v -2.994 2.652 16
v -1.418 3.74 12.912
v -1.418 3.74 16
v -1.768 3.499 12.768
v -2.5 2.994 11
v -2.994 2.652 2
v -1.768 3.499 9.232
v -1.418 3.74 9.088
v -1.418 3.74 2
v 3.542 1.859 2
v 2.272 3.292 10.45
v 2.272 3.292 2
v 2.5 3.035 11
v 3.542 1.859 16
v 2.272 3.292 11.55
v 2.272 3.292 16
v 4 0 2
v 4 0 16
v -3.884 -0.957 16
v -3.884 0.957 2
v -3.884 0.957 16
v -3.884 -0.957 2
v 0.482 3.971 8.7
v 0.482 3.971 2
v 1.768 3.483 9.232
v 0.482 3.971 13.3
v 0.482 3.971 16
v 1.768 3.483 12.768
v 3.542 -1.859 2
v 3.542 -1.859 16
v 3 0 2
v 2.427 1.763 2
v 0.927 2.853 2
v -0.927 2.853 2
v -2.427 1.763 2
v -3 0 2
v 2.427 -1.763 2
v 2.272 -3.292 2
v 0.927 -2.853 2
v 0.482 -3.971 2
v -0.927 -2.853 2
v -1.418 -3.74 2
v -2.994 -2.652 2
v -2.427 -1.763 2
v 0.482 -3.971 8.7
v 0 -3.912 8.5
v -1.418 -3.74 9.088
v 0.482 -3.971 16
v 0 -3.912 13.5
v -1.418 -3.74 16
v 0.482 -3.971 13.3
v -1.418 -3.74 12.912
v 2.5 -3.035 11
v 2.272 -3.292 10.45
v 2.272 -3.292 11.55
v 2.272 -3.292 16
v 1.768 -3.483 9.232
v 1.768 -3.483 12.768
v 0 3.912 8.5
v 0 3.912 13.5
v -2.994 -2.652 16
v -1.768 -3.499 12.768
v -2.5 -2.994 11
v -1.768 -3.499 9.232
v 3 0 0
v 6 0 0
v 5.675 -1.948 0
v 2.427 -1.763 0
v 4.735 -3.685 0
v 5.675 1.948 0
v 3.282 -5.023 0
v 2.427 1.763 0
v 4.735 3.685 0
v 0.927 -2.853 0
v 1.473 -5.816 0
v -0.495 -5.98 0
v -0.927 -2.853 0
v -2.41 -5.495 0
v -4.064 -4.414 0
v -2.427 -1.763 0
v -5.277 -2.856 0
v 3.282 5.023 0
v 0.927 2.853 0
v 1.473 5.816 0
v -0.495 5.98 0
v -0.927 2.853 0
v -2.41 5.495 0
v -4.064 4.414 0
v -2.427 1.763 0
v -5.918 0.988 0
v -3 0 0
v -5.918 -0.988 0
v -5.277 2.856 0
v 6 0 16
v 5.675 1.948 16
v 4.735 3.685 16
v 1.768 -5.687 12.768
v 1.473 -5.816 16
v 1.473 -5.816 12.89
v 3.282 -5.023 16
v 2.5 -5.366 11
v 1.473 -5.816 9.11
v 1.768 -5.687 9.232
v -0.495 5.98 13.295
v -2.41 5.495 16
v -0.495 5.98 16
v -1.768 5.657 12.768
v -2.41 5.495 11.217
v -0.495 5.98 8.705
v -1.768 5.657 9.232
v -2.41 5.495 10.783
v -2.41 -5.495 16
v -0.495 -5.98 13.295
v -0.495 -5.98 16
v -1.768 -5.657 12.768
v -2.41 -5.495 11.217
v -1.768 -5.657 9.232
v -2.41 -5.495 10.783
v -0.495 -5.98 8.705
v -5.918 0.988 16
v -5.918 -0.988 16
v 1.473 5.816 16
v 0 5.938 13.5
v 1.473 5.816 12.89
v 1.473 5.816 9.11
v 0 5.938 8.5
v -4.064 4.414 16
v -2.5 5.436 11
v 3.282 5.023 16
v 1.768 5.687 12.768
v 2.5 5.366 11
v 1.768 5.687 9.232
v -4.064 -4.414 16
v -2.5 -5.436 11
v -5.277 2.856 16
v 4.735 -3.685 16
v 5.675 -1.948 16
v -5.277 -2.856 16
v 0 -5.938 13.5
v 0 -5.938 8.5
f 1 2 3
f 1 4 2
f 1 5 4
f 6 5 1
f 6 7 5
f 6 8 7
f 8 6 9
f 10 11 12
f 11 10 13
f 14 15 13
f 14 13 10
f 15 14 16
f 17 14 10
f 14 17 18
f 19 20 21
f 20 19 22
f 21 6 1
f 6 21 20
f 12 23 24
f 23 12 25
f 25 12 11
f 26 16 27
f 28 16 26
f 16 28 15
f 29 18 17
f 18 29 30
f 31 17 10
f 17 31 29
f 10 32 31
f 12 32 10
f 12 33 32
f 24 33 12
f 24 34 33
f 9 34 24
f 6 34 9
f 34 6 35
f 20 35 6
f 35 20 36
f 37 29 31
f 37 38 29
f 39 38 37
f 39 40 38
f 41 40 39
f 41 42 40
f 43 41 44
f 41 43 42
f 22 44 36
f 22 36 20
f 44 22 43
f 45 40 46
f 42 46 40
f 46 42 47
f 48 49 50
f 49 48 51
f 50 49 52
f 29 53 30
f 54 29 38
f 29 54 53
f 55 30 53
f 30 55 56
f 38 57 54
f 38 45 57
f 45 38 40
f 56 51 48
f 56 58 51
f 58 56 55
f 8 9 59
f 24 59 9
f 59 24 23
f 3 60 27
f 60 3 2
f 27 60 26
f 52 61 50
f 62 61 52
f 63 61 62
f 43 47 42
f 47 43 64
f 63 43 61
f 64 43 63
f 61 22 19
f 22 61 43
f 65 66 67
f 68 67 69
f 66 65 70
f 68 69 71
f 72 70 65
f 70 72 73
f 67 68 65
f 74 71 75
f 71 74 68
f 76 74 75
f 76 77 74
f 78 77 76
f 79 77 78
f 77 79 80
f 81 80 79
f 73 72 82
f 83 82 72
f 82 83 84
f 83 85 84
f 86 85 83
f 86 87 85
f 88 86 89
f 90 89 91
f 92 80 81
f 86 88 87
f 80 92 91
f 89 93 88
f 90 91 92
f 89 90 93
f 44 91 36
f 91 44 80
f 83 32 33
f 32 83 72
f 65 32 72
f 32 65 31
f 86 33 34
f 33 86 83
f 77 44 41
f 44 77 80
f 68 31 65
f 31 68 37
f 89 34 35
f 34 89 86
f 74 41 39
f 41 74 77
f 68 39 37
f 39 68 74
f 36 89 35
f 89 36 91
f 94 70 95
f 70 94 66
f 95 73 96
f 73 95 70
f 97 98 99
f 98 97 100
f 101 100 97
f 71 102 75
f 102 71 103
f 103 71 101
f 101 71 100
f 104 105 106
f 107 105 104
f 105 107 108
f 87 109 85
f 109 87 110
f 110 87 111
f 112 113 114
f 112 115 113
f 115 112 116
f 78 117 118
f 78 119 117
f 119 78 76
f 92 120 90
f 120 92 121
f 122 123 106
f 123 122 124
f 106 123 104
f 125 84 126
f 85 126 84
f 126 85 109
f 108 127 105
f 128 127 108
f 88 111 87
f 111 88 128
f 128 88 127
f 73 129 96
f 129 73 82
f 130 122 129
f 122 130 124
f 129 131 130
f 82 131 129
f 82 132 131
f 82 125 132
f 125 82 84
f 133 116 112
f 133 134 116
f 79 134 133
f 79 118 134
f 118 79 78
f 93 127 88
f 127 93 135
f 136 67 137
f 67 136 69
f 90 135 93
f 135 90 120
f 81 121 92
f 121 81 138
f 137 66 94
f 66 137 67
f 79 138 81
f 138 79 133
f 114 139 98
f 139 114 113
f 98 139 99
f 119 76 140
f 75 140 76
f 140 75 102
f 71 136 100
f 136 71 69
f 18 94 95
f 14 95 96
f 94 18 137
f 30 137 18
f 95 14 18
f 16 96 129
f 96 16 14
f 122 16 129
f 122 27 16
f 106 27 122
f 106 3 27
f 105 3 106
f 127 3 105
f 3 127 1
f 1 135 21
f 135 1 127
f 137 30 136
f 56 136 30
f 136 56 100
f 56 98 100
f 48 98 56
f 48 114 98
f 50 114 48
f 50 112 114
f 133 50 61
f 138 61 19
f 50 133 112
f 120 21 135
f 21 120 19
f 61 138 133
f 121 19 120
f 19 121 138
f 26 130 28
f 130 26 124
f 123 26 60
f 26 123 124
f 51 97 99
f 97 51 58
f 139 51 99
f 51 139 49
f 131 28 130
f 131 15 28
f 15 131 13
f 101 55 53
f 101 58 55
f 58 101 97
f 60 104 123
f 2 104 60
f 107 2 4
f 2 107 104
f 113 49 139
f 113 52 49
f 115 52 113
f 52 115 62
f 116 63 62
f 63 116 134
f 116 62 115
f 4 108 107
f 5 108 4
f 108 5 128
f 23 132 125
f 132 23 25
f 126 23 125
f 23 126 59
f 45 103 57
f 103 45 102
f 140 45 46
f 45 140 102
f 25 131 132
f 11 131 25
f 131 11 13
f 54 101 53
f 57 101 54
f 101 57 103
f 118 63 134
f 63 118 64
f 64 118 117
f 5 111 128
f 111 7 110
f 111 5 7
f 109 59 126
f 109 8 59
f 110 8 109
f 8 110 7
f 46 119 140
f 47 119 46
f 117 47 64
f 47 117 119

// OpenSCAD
difference() {
	union() {
		difference() {
			cylinder(d = 8, h = 2);
			translate(v = [0, 0, -2]) {
				cylinder(d = 6, h = 4);
			}
		}
		difference() {
			cylinder(d = 12, h = 16);
			translate(v = [0, 0, -16]) {
				cylinder(d = 8, h = 32);
			}
		}
	}
	translate(v = [0, 0, 11]) {
		translate(v = [0, 15.0000000000, 0]) {
			rotate(a = [90, 0, 0]) {
				cylinder(d = 5, h = 30);
			}
		}
	}
}
